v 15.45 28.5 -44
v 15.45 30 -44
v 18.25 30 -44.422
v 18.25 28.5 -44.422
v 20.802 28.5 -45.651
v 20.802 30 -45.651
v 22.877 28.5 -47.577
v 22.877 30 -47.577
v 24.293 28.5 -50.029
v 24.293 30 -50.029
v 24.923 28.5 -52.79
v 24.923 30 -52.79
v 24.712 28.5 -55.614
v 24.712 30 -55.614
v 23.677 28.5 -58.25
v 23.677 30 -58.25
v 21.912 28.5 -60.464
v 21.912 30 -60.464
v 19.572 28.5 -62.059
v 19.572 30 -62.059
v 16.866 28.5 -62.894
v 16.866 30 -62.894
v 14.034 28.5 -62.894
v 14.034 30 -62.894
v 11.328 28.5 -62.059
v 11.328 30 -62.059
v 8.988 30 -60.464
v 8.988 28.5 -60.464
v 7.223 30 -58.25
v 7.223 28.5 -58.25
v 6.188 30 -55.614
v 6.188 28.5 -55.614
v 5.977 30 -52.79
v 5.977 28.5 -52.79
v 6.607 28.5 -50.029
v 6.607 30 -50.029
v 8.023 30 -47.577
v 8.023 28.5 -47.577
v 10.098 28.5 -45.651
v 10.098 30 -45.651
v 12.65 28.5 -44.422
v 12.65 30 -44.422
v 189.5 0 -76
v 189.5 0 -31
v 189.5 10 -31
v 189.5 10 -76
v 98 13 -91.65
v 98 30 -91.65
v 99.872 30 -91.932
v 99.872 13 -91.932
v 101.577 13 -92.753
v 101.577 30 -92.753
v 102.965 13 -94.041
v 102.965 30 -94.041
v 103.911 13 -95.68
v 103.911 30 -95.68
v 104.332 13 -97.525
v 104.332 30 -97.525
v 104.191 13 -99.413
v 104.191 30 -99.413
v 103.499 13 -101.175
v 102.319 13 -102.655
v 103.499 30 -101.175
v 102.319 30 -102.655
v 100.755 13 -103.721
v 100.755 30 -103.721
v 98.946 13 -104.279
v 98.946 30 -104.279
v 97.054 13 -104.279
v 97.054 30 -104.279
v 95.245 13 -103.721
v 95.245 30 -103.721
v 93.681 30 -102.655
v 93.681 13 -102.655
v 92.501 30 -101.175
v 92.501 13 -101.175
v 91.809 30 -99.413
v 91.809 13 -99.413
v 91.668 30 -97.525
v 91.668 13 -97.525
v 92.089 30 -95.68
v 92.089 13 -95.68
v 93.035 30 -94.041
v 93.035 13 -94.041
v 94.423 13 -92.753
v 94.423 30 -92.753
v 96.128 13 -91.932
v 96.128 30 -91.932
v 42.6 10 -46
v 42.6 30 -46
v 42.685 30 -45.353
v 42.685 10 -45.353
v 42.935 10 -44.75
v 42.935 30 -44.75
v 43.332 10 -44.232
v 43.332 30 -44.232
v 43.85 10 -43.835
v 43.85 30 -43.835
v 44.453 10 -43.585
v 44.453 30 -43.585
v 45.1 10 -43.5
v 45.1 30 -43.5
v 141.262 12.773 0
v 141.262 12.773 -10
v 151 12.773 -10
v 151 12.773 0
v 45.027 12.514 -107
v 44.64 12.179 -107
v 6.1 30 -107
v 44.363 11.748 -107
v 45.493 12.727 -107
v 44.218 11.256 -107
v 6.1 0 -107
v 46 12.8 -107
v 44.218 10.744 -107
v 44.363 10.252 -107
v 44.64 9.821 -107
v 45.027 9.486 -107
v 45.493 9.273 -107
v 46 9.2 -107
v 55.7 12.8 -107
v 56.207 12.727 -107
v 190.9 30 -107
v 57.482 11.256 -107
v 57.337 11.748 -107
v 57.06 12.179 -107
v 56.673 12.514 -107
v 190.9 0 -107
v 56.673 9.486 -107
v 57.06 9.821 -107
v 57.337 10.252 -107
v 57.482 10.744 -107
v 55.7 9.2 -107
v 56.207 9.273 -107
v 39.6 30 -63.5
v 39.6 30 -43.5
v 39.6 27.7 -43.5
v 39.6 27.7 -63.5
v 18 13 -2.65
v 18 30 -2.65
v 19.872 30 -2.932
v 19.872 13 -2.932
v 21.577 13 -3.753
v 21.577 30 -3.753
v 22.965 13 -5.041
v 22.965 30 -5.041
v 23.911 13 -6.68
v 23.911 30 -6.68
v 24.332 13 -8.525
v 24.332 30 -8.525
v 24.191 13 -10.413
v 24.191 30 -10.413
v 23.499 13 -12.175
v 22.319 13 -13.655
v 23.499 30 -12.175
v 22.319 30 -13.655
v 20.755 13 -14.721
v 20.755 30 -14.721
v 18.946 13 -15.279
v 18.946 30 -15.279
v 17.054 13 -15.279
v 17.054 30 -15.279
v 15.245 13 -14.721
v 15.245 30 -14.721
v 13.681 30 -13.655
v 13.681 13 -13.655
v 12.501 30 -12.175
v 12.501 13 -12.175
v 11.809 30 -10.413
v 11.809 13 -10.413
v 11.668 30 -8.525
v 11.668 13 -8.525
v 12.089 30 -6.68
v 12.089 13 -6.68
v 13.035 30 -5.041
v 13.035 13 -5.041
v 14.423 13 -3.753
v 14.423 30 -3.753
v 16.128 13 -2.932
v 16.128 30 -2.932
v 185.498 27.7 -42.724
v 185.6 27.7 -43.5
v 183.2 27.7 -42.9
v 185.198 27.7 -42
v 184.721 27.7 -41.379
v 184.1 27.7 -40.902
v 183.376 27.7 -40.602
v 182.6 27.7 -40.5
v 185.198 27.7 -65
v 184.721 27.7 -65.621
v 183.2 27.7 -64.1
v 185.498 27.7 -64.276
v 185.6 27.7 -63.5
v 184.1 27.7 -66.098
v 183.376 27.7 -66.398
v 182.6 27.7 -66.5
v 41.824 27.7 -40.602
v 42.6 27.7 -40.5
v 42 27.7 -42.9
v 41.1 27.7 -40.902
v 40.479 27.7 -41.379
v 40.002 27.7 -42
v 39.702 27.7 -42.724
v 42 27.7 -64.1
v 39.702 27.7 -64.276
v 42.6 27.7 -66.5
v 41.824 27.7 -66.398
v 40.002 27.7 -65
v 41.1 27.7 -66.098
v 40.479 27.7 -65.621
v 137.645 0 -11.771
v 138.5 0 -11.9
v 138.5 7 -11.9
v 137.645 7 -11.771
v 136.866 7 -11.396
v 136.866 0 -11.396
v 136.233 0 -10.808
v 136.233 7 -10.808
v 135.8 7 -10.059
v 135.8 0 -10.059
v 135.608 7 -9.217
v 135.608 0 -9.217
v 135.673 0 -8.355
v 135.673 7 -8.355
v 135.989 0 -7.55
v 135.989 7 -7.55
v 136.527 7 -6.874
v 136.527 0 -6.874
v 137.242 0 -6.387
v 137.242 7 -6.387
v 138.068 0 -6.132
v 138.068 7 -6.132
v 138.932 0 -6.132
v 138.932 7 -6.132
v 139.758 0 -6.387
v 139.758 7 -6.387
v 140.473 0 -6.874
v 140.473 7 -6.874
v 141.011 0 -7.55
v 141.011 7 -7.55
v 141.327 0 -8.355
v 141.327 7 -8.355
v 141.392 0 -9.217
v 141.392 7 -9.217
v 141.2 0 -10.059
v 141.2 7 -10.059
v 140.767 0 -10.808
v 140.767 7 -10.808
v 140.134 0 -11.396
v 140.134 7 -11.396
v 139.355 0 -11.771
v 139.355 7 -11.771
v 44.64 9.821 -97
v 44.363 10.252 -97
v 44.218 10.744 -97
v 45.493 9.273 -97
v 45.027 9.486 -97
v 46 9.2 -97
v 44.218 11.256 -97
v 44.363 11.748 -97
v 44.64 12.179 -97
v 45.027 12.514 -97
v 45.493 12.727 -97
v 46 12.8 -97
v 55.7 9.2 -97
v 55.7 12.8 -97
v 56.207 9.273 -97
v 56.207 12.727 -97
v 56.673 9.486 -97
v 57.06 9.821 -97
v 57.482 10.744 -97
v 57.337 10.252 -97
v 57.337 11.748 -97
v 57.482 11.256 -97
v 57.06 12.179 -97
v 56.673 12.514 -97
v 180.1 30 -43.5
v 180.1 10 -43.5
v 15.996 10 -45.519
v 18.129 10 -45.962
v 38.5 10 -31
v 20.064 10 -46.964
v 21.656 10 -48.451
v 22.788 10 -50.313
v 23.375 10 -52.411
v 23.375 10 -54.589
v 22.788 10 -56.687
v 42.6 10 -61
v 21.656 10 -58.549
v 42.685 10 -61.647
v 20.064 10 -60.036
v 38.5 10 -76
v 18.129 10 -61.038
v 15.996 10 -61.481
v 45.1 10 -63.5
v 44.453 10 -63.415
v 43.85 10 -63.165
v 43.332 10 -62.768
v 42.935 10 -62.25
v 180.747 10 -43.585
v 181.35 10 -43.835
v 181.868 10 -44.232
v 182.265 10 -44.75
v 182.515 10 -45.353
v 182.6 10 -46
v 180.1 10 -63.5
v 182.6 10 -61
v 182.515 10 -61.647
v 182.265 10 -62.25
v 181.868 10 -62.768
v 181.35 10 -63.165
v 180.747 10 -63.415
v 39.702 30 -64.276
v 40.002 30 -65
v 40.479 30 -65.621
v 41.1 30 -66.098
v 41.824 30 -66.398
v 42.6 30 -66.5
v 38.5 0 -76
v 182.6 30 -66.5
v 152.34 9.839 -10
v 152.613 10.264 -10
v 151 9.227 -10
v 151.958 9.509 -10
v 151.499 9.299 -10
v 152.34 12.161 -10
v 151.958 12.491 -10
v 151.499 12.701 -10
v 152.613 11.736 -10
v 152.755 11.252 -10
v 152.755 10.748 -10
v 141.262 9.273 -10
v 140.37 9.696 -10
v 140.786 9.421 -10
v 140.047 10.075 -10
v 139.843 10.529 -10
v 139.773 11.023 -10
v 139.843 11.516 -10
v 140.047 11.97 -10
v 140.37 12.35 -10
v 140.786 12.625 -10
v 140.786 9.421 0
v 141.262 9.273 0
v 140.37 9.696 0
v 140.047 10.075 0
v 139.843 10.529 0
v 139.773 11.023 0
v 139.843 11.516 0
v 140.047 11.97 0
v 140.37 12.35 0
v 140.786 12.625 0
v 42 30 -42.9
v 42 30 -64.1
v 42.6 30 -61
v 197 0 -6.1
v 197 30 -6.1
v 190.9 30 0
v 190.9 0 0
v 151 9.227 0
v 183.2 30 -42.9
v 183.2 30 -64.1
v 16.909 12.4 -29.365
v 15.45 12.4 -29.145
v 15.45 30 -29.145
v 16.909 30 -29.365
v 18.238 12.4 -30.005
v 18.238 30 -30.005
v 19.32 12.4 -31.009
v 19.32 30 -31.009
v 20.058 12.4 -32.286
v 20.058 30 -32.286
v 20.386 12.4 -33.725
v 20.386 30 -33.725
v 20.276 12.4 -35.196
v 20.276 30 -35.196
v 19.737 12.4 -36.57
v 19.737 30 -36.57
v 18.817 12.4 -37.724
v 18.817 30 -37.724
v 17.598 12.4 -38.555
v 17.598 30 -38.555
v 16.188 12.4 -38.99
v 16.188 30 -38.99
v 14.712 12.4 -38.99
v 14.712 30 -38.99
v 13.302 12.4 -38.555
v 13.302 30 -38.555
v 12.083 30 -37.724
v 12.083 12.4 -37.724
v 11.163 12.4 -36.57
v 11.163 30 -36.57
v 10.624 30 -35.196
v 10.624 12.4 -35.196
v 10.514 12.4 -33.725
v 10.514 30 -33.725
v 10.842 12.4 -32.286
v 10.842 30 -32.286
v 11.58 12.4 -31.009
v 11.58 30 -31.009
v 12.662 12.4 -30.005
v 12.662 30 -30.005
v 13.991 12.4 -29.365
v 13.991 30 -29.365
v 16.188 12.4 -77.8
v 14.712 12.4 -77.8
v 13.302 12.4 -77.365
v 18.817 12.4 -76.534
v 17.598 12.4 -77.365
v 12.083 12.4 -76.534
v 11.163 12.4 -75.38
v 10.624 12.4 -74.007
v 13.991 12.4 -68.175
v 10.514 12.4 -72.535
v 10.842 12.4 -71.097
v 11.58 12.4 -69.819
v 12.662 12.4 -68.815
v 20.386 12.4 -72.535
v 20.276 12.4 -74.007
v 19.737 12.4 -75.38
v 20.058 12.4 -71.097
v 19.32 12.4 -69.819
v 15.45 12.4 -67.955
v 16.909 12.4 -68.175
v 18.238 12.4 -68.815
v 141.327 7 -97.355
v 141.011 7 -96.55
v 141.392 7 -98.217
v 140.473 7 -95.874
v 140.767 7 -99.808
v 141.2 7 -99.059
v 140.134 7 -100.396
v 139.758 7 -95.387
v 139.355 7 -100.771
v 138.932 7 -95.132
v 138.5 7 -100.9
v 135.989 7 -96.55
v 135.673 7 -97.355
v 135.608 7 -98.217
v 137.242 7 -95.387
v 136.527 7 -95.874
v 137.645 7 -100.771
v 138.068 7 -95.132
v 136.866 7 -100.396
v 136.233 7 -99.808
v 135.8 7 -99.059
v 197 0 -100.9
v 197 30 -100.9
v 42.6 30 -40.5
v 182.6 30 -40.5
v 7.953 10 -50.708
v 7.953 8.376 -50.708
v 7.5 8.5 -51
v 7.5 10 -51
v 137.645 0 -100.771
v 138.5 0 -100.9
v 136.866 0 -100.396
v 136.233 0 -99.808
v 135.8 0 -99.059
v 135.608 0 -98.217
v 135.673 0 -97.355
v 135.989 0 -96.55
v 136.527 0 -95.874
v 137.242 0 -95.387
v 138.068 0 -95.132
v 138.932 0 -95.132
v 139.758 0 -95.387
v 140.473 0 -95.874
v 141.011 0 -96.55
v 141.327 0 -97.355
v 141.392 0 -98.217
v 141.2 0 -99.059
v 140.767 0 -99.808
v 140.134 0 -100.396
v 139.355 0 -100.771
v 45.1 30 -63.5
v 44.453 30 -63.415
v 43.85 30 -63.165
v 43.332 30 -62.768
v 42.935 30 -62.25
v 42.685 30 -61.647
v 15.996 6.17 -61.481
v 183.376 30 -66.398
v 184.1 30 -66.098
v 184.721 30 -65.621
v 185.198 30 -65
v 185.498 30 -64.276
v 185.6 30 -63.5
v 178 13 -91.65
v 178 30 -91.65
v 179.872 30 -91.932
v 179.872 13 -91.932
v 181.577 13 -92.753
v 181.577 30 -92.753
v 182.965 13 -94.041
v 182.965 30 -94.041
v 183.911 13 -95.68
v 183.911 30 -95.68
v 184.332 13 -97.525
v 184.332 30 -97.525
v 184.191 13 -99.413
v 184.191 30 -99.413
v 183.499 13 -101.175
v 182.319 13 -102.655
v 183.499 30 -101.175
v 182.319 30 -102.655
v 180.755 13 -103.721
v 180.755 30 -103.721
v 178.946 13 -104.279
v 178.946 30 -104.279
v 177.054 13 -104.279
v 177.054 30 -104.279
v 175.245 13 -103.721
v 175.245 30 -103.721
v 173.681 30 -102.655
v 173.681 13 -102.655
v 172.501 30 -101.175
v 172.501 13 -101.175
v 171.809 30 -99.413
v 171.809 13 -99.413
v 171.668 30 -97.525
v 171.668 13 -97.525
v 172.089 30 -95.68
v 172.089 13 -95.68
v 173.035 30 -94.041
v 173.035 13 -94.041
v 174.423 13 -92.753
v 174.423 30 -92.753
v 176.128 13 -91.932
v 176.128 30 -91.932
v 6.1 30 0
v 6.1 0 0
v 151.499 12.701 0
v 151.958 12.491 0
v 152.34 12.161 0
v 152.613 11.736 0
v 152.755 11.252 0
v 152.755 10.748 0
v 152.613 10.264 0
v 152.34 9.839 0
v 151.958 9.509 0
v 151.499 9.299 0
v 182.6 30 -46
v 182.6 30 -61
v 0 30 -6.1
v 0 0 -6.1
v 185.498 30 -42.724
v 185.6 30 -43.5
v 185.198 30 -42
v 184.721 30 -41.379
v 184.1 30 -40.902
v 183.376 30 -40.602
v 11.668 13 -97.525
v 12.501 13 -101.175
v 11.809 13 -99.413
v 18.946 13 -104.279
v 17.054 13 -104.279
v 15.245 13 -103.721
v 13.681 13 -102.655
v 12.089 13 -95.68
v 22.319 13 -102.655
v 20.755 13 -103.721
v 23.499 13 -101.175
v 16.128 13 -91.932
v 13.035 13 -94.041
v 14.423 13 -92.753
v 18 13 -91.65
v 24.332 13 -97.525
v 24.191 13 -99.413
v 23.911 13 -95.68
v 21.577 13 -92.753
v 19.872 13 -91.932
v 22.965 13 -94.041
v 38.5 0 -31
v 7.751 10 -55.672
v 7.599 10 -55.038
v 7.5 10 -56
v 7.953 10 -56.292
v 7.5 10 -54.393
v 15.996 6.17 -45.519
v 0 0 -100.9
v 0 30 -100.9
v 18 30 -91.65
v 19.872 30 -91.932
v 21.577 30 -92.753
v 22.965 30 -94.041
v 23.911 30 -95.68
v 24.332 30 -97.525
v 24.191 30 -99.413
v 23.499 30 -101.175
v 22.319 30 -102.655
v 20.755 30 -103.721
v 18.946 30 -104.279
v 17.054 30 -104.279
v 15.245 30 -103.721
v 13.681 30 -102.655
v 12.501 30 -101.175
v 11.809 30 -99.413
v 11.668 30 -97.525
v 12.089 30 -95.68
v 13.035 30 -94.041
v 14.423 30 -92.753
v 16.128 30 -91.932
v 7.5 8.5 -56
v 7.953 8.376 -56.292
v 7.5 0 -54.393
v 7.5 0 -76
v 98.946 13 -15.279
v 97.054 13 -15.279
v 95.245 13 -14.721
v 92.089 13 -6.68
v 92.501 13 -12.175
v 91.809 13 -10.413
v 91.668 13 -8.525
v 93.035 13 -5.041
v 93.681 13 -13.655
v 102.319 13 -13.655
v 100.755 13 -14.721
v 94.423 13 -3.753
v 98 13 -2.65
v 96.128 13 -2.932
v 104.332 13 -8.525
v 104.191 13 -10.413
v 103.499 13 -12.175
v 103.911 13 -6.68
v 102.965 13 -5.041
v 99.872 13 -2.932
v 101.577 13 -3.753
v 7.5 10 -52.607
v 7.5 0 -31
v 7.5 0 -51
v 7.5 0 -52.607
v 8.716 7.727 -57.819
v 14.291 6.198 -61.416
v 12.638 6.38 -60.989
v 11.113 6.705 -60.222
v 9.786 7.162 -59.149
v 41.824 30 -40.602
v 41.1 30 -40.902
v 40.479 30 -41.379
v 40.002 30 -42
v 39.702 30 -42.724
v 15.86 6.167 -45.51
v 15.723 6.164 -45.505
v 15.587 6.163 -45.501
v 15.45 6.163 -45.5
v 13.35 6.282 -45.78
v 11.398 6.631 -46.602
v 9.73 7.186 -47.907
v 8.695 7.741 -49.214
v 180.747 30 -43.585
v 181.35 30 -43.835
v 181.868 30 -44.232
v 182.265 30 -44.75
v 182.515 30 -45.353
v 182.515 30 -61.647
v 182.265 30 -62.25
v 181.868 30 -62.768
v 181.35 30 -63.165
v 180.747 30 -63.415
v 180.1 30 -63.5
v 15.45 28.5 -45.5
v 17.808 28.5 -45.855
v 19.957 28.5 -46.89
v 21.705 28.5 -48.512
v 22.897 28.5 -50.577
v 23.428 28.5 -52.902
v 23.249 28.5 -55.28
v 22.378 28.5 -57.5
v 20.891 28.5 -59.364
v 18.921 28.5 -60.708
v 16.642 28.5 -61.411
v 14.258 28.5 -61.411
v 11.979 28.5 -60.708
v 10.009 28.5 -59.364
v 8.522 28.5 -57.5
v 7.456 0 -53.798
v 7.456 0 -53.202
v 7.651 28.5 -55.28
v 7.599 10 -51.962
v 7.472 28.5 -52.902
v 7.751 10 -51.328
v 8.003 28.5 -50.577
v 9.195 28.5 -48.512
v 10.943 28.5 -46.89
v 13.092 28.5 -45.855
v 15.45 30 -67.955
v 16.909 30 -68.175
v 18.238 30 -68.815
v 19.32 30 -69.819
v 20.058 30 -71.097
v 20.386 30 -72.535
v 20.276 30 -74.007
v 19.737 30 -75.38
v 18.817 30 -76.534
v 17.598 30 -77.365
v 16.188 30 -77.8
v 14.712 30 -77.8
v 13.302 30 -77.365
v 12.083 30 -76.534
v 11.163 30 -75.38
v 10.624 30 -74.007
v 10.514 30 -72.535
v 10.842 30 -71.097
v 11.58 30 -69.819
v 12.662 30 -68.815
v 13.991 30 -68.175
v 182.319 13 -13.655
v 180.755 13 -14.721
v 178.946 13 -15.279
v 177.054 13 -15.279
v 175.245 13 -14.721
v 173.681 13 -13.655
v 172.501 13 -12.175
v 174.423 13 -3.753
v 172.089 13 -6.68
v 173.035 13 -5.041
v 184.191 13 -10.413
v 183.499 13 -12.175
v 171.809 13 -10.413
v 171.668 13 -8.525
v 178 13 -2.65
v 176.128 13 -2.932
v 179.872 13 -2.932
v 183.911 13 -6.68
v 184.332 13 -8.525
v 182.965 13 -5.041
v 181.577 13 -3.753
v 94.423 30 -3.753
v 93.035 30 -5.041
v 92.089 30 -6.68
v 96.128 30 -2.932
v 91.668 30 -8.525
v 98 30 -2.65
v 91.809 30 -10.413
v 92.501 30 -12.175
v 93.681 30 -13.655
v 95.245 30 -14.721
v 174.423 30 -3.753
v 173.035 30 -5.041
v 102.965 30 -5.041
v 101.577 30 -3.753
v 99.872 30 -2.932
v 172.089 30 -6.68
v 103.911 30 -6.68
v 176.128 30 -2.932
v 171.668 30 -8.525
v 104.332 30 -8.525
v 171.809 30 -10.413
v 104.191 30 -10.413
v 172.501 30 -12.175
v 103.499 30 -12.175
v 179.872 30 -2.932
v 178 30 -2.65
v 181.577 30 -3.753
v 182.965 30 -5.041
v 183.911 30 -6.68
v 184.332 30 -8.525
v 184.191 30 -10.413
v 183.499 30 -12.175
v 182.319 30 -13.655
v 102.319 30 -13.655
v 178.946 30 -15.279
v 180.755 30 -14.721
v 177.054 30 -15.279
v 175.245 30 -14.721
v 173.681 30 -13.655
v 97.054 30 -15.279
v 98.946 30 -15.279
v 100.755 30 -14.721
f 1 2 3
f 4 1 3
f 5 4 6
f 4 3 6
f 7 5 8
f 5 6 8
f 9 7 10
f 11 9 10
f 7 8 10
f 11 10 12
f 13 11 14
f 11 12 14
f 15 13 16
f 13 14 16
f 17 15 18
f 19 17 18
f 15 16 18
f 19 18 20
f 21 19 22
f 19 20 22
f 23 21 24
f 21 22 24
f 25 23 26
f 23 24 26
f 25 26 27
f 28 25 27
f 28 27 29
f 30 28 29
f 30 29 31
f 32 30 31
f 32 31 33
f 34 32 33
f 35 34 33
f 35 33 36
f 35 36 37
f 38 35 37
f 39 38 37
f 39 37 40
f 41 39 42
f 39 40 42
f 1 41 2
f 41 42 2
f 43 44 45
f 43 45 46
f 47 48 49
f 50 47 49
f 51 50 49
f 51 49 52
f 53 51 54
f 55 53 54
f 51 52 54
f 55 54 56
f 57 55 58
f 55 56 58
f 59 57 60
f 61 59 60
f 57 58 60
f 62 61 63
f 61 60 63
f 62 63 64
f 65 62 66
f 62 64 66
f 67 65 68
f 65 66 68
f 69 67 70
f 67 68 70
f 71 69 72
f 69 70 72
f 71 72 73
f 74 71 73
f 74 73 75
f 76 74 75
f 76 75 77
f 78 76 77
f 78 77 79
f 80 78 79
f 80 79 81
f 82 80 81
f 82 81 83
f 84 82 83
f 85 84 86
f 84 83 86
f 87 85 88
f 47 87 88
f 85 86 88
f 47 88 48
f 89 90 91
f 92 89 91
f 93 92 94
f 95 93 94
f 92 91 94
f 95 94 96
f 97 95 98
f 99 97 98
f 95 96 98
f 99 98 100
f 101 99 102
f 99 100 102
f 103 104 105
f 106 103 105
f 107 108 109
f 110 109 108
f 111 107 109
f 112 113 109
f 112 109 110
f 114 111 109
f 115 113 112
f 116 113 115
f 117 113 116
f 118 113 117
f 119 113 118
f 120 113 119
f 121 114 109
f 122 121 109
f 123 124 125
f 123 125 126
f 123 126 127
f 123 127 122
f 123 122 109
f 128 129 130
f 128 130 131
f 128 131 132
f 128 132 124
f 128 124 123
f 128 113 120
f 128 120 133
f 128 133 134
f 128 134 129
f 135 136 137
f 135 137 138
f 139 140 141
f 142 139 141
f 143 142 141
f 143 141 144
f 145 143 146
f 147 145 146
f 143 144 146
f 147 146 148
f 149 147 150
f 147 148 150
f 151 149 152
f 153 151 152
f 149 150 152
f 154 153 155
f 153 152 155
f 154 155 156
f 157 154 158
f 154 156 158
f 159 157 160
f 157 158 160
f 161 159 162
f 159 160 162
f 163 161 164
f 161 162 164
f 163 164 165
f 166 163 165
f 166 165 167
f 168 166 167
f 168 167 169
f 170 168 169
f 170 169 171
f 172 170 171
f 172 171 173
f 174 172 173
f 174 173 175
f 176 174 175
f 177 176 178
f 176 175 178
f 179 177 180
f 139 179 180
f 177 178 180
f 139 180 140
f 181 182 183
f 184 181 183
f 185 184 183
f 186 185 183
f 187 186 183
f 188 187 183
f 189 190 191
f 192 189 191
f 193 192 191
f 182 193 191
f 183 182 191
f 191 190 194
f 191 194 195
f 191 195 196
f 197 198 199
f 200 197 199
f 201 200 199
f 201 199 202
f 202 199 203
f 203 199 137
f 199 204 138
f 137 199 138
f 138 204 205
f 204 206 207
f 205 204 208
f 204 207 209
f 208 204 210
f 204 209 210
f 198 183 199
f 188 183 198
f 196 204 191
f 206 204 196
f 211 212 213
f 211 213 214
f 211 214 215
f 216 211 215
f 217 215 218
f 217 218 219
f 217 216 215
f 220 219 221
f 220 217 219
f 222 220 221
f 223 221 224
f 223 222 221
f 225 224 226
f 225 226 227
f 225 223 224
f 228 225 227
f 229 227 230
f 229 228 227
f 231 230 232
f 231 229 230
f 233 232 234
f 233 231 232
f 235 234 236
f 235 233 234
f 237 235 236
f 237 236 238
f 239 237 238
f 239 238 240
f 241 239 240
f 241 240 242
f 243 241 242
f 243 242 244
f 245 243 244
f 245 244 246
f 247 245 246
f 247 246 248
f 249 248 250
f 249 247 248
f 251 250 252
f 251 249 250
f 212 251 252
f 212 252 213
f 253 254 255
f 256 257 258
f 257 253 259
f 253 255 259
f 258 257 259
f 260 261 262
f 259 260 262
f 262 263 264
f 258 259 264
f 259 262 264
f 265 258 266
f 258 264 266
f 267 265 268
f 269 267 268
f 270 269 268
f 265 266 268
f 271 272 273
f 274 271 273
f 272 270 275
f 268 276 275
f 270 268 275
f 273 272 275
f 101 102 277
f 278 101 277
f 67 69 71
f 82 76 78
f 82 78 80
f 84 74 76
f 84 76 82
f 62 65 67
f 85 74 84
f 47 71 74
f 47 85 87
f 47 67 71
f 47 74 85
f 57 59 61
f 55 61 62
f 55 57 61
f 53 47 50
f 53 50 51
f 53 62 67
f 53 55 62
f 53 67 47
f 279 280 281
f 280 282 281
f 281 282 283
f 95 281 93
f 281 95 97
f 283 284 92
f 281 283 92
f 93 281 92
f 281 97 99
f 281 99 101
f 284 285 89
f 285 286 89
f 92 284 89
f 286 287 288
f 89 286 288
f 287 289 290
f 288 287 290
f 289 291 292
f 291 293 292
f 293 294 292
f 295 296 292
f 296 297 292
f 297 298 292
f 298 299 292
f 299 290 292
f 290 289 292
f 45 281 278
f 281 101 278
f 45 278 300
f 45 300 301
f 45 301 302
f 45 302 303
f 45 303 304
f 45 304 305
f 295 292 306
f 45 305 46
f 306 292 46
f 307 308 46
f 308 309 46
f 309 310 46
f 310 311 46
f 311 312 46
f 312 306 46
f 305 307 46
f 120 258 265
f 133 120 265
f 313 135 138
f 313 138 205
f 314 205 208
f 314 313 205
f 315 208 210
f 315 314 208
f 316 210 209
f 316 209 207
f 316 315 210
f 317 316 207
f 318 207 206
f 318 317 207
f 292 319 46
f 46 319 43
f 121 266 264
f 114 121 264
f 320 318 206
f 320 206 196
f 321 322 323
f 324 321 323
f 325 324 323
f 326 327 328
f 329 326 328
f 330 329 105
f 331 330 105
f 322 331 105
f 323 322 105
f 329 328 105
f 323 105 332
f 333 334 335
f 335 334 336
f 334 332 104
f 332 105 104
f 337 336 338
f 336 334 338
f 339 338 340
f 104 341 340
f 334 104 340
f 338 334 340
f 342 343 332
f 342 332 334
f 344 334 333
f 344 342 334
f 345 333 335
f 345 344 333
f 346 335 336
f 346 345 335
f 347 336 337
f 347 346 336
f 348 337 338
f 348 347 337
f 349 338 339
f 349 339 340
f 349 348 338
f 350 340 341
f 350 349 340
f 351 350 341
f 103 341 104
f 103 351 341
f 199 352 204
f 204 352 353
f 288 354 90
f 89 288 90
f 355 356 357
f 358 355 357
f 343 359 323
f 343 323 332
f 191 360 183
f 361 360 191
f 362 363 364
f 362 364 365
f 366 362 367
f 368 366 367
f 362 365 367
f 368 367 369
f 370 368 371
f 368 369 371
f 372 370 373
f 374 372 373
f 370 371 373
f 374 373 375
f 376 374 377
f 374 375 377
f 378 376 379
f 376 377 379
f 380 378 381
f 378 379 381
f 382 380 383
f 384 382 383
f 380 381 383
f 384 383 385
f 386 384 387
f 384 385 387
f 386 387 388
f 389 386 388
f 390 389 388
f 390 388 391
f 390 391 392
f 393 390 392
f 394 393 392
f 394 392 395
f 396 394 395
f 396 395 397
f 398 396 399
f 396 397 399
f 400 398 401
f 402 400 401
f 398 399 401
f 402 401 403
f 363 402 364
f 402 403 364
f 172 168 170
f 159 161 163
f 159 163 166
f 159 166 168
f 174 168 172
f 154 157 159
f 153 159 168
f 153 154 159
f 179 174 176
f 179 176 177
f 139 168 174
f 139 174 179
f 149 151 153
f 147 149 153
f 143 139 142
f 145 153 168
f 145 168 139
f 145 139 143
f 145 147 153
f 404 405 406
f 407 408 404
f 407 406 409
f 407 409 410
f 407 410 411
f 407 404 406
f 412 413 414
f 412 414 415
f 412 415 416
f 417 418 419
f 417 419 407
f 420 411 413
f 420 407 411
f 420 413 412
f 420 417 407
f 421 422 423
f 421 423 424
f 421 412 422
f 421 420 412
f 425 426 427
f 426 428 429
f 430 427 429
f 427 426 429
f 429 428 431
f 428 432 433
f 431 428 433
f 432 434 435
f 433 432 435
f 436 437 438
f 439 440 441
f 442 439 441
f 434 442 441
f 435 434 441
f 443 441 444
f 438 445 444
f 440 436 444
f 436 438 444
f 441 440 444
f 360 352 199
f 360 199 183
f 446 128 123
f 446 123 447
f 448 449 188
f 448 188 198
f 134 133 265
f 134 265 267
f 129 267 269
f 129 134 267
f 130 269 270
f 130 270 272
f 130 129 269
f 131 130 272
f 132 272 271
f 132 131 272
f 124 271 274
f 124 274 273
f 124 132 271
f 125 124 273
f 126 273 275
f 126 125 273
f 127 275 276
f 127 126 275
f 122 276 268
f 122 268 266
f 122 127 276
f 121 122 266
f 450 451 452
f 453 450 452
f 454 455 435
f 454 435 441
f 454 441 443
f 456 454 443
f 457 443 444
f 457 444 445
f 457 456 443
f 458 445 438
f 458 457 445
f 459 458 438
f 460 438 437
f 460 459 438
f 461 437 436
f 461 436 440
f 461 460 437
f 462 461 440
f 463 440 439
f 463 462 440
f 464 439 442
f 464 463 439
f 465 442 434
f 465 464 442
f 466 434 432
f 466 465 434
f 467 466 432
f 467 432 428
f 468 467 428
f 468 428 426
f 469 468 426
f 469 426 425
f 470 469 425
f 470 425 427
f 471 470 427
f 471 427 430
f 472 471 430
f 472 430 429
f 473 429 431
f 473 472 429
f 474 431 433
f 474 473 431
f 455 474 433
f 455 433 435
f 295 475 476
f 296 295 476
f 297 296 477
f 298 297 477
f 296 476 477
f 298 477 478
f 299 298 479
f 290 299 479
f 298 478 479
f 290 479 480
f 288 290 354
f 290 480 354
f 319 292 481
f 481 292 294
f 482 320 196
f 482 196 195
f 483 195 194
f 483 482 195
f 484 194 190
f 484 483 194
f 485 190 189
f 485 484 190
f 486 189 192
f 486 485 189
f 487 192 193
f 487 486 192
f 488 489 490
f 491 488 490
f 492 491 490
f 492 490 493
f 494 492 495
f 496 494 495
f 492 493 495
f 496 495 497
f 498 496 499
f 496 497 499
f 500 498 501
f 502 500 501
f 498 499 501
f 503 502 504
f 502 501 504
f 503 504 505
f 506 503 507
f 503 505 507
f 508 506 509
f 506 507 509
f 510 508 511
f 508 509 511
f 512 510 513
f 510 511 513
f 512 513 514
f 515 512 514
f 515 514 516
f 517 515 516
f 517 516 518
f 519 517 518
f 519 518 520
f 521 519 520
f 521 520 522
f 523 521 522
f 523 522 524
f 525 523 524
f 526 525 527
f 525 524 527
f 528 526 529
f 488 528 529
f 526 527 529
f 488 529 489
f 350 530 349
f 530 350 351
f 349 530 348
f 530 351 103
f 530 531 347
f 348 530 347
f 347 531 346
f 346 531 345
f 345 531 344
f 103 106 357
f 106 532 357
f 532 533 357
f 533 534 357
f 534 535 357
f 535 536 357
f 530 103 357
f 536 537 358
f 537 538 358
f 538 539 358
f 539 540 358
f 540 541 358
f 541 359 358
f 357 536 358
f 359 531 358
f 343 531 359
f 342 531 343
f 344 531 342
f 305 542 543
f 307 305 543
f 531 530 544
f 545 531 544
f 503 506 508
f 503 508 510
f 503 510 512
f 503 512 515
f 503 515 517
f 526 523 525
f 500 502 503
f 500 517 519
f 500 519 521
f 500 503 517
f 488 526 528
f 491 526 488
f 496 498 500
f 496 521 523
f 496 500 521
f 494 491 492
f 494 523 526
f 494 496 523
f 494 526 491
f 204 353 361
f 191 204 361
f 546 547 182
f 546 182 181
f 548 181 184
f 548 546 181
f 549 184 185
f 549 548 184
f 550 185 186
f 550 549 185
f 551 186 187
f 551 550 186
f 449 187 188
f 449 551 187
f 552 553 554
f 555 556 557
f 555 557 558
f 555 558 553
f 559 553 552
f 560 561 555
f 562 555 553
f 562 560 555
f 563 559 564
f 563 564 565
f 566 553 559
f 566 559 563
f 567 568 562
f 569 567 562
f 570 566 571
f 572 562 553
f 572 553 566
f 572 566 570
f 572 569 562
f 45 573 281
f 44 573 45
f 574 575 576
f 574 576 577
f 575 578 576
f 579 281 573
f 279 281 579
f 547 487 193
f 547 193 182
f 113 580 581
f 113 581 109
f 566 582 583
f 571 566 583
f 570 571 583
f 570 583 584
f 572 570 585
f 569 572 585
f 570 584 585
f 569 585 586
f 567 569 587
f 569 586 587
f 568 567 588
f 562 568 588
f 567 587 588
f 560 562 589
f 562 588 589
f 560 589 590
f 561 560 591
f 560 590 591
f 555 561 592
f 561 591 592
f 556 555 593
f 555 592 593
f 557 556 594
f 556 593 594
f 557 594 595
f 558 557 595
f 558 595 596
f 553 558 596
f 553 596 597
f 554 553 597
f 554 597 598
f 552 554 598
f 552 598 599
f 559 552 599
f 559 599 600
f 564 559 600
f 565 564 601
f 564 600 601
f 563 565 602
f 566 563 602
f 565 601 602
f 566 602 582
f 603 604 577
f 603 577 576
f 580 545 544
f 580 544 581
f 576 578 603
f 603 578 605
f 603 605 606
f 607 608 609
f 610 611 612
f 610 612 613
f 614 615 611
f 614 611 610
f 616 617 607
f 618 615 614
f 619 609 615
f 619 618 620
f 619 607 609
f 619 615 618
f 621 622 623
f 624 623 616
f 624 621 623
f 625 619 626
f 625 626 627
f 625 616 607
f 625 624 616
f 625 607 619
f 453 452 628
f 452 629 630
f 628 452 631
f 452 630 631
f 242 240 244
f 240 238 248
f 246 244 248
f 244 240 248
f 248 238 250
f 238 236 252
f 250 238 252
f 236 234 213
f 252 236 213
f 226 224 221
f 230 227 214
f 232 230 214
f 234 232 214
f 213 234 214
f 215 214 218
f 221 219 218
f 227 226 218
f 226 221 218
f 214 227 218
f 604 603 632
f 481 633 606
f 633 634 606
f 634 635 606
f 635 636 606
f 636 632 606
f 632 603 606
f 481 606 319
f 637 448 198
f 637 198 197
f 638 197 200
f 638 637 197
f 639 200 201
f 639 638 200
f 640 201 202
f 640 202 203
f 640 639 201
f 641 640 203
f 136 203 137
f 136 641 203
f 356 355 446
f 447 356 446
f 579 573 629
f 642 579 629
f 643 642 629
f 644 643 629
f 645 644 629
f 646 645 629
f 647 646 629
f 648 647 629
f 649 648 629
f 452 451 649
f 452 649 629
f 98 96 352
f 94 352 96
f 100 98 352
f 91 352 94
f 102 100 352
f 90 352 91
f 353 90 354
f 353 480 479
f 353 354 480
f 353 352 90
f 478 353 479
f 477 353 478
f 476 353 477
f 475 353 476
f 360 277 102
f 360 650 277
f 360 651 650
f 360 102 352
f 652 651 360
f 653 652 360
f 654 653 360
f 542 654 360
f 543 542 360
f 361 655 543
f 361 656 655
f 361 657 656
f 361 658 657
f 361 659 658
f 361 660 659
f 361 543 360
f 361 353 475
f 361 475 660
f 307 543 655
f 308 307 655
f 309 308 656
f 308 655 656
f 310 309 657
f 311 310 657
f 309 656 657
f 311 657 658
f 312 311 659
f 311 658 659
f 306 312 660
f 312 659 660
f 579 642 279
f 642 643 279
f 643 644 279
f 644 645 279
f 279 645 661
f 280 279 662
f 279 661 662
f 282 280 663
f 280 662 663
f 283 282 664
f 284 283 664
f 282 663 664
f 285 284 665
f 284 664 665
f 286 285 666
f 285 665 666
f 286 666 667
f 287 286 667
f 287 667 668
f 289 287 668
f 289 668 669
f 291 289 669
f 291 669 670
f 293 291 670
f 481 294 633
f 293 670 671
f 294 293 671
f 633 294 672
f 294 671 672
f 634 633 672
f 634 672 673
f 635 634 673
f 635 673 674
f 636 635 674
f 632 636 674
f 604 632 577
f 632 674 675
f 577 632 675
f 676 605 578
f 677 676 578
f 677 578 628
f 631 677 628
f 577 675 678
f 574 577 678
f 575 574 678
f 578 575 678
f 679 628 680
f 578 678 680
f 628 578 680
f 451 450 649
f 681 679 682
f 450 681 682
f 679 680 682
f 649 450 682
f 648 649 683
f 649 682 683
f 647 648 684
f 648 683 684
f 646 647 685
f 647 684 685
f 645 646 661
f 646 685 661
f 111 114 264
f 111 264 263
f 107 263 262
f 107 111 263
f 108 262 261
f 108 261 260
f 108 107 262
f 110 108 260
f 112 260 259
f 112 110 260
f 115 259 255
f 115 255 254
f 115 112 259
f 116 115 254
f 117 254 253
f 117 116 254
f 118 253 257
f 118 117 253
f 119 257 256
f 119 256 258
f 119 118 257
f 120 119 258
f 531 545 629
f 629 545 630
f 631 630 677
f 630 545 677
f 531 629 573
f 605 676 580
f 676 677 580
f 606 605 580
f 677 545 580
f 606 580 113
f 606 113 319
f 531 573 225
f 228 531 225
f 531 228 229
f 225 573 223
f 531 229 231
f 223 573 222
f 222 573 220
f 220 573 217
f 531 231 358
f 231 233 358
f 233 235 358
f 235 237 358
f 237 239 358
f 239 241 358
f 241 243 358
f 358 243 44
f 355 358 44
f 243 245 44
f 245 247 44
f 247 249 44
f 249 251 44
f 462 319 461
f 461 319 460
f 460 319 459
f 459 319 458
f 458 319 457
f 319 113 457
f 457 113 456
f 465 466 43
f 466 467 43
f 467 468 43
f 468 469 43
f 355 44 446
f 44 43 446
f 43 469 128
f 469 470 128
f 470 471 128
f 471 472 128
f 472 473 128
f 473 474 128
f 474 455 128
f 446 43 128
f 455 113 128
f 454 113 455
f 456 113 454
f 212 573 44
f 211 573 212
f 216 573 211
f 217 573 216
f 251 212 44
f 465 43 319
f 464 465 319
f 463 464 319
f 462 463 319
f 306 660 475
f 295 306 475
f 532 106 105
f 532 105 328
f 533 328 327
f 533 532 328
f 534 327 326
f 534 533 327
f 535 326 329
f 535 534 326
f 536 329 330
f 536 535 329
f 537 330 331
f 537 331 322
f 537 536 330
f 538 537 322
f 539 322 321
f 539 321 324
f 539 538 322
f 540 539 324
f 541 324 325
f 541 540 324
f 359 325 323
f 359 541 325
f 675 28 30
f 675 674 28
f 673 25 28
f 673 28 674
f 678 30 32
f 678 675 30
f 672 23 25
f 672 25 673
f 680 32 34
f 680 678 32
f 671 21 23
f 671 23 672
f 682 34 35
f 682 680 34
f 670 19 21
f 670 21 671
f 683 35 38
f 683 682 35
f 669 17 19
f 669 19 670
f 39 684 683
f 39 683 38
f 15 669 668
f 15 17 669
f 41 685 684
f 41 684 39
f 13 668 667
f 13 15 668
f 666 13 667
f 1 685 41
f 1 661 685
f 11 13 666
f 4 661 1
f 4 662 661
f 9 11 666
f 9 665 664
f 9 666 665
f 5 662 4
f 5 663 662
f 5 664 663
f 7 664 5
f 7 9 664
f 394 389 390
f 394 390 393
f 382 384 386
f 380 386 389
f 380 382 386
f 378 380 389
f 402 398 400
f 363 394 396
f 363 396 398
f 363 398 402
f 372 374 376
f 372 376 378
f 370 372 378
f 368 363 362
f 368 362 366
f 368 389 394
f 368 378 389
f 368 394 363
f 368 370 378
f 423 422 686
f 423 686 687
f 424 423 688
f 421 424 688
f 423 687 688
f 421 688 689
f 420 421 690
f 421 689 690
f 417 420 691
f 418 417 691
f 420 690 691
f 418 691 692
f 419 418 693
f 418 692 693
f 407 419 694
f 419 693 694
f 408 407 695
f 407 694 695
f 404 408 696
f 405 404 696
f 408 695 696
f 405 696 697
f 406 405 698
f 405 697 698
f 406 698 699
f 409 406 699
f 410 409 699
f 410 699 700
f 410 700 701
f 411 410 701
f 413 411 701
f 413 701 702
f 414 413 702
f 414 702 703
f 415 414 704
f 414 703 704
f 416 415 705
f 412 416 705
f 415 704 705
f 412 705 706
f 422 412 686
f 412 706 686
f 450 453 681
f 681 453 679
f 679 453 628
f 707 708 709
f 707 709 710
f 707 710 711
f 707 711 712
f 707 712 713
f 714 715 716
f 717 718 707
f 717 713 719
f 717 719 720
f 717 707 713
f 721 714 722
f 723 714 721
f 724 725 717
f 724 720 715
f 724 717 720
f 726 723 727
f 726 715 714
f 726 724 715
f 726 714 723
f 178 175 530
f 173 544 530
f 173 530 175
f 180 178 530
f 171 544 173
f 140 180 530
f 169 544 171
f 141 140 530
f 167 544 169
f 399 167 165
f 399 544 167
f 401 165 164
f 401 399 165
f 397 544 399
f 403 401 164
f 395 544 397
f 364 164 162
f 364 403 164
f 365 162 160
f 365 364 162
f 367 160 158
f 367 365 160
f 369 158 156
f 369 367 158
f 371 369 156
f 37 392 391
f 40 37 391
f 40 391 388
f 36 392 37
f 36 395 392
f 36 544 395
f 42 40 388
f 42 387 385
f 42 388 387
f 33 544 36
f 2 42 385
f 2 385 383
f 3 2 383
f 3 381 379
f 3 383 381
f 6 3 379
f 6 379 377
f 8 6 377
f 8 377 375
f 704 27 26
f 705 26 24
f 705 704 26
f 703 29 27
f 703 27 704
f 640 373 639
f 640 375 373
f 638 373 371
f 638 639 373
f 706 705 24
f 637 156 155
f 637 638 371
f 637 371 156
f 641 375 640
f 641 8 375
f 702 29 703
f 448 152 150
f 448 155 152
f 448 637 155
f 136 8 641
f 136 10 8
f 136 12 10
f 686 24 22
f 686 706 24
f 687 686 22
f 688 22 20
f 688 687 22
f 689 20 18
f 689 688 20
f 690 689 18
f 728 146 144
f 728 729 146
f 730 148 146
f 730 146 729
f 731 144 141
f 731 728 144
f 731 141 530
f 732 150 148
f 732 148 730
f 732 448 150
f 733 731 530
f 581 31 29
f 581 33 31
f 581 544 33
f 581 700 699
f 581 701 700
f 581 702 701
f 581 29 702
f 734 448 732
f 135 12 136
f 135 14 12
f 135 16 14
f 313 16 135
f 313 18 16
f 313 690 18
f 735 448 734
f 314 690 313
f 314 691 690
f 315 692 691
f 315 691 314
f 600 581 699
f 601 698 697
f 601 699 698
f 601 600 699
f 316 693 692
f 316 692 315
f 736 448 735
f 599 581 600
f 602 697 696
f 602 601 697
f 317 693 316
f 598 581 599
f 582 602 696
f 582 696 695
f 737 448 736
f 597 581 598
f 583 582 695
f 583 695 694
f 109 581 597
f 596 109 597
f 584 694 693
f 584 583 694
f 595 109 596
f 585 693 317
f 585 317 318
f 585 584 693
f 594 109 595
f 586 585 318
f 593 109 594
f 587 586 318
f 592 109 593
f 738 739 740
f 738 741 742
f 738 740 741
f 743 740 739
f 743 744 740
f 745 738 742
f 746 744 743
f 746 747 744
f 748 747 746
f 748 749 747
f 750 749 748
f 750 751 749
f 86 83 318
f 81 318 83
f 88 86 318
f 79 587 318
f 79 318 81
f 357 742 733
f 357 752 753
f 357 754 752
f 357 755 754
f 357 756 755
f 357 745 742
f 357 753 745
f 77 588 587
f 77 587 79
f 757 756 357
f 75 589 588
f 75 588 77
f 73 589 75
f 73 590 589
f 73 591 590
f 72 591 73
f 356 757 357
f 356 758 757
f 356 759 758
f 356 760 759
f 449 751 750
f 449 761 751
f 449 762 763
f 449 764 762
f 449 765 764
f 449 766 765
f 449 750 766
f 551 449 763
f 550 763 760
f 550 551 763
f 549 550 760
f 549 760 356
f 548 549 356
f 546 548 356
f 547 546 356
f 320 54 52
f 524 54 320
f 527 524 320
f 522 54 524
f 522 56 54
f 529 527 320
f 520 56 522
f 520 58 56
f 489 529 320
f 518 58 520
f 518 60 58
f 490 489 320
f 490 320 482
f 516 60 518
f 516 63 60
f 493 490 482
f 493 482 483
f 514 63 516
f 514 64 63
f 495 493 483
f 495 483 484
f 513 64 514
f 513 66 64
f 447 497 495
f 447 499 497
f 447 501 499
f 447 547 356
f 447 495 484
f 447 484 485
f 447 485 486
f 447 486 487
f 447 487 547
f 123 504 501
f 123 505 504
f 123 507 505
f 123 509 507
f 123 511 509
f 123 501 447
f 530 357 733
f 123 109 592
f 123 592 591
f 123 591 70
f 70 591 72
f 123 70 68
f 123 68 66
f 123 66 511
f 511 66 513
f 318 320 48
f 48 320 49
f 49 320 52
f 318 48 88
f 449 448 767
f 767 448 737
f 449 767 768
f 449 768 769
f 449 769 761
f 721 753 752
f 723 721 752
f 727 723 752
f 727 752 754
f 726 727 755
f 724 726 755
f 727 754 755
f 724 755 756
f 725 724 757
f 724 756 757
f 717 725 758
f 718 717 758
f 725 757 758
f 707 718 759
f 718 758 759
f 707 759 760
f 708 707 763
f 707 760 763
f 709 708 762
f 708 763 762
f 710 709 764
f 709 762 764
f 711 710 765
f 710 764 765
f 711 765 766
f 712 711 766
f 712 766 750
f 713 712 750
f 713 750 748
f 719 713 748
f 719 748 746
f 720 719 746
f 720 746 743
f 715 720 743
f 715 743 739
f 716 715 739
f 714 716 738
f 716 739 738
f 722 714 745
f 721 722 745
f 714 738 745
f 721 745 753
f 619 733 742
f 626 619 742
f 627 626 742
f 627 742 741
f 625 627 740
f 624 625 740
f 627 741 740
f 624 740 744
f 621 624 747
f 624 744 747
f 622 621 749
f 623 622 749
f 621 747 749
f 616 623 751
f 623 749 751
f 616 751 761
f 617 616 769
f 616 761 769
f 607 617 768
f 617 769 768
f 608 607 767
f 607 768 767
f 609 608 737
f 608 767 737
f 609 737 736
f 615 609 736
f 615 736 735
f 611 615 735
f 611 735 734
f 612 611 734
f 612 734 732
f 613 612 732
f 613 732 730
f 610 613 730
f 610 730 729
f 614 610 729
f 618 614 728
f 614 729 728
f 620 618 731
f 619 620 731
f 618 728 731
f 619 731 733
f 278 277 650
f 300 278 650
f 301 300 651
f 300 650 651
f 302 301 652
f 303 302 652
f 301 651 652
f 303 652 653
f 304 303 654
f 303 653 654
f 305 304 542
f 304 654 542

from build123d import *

# Parameters (mm, degrees)
SKETCH1_W            = 197
SKETCH1_H            = 107
BOSS_EXTRUDE1_DEPTH  = 30
SKETCH4_W            = 182
SKETCH4_H            = 45
CUT_EXTRUDE2_DEPTH   = 10
BOSS_EXTRUDE11_DEPTH = 10
CUT_EXTRUDE28_DEPTH  = 14.5
SKETCH9_R            = 8
CUT_EXTRUDE6_DEPTH   = 171
SKETCH10_R           = 9.5
CUT_EXTRUDE7_DEPTH   = 1.5
SKETCH11_R           = 4.95
CUT_EXTRUDE8_DEPTH   = 17.6
SKETCH41_R           = 2.9
CUT_EXTRUDE21_DEPTH  = 7
CUT_EXTRUDE22_DEPTH  = 10
CUT_EXTRUDE23_DEPTH  = 10
CUT_EXTRUDE29_DEPTH  = 14.5
CUT_EXTRUDE36_DEPTH  = 55.4
SKETCH90_R           = 6.35
CUT_EXTRUDE38_DEPTH  = 17
SKETCH91_W           = 141.2
SKETCH91_H           = 21.2
CUT_EXTRUDE39_DEPTH  = 2.3
CUT_EXTRUDE40_DEPTH  = 227.181343174


with BuildPart() as part:
    # Sketch1 → Boss-Extrude1 (new body)
    with BuildSketch(Plane(origin=(0, 0, 0), x_dir=(1, 0, 0), z_dir=(0, 1, 0))):
        with Locations((98.5, 53.5)):
            Rectangle(SKETCH1_W, SKETCH1_H)
    extrude(amount=BOSS_EXTRUDE1_DEPTH)

    # Sketch4 → Cut-Extrude2 (cut)
    with BuildSketch(Plane(origin=(0, 0, 0), x_dir=(1, 0, 0), z_dir=(0, 1, 0))):
        with Locations((98.5, 53.5)):
            Rectangle(SKETCH4_W, SKETCH4_H)
    extrude(amount=CUT_EXTRUDE2_DEPTH, mode=Mode.SUBTRACT)

    # Sketch53 → Boss-Extrude11 (add)
    with BuildSketch(Plane(origin=(0, 10, 0), x_dir=(-1, 0, 0), z_dir=(0, -1, 0))):
        Polygon((-7.5, 51), (-7.5, 31), (-38.5, 31), align=None)
        Polygon((-7.5, 56), (-7.5, 76), (-38.5, 76), align=None)
    extrude(amount=BOSS_EXTRUDE11_DEPTH)

    # Izq → Cut-Extrude28 (cut)
    with BuildSketch(Plane(origin=(0, 27.358390683, -11.62731604), x_dir=(1, 0, 0), z_dir=(0, 0.9203309184584746, -0.3911406403448515))):
        Polygon((7.5, 48.213835991), (38.5, 69.945149803), (7.5, 69.945149803), align=None)
    extrude(amount=-CUT_EXTRUDE28_DEPTH, mode=Mode.SUBTRACT)

    # Sketch9 → Cut-Extrude6 (cut)
    with BuildSketch(Plane(origin=(0, 30, 0), x_dir=(1, 0, 0), z_dir=(0, 1, 0))):
        with Locations(Location((15.45, 53.5, 0), (0, 0, 270))):
            Circle(SKETCH9_R)
    extrude(amount=-CUT_EXTRUDE6_DEPTH, mode=Mode.SUBTRACT)

    # Sketch10 → Cut-Extrude7 (cut)
    with BuildSketch(Plane(origin=(0, 30, 0), x_dir=(1, 0, 0), z_dir=(0, 1, 0))):
        with Locations(Location((15.45, 53.5, 0), (0, 0, 270))):
            Circle(SKETCH10_R)
    extrude(amount=-CUT_EXTRUDE7_DEPTH, mode=Mode.SUBTRACT)

    # Sketch11 → Cut-Extrude8 (cut)
    with BuildSketch(Plane(origin=(0, 30, 0), x_dir=(1, 0, 0), z_dir=(0, 1, 0))):
        with Locations(Location((15.45, 72.905102572, 0), (0, 0, 270))):
            Circle(SKETCH11_R)
        with Locations(Location((15.45, 34.094897428, 0), (0, 0, 270))):
            Circle(SKETCH11_R)
    extrude(amount=-CUT_EXTRUDE8_DEPTH, mode=Mode.SUBTRACT)

    # Sketch41 → Cut-Extrude21 (cut)
    with BuildSketch(Plane(origin=(0, 0, 0), x_dir=(1, 0, 0), z_dir=(0, 1, 0))):
        with Locations(Location((138.5, 9, 0), (0, 0, 90))):
            Circle(SKETCH41_R)
        with Locations(Location((138.5, 98, 0), (0, 0, 90))):
            Circle(SKETCH41_R)
    extrude(amount=CUT_EXTRUDE21_DEPTH, mode=Mode.SUBTRACT)

    # Sketch42 → Cut-Extrude22 (cut)
    with BuildSketch(Plane.XY):
        with BuildLine():
            Line((141.261527075, 12.77273886), (151, 12.77273886))
            ThreePointArc((151, 12.77273886), (152.77273886, 11), (151, 9.22726114))
            Line((151, 9.22726114), (141.261527075, 9.27273886))
            ThreePointArc((141.261527075, 9.27273886), (139.77273886, 11.02273886), (141.261527075, 12.77273886))
        make_face()
    extrude(amount=-CUT_EXTRUDE22_DEPTH, mode=Mode.SUBTRACT)

    # Sketch43 → Cut-Extrude23 (cut)
    with BuildSketch(Plane(origin=(0, 0, -107), x_dir=(-1, 0, 0), z_dir=(0, 0, -1))):
        with BuildLine():
            Line((-55.7, 12.8), (-46, 12.8))
            ThreePointArc((-46, 12.8), (-44.2, 11), (-46, 9.2))
            Line((-46, 9.2), (-55.7, 9.2))
            ThreePointArc((-55.7, 9.2), (-57.5, 11), (-55.7, 12.8))
        make_face()
    extrude(amount=-CUT_EXTRUDE23_DEPTH, mode=Mode.SUBTRACT)

    # Der → Cut-Extrude29 (cut)
    with BuildSketch(Plane(origin=(0, -11.159343568, -4.742721016), x_dir=(1, 0, 0), z_dir=(0, 0.9203309184584747, 0.3911406403448517))):
        Polygon((7.5, 50.261572284), (38.5, 28.530258472), (7.5, 28.530258472), align=None)
    extrude(amount=-CUT_EXTRUDE29_DEPTH, mode=Mode.SUBTRACT)

    # Sketch85 → Cut-Extrude36 (cut)
    with BuildSketch(Plane(origin=(0, 30, 0), x_dir=(1, 0, 0), z_dir=(0, 1, 0))):
        Polygon((0, 100.9), (6.1, 107), (0, 107), align=None)
        Polygon((0, 0), (6.1, 0), (0, 6.1), align=None)
        Polygon((197, 6.1), (190.9, 0), (197, 0), align=None)
        Polygon((197, 107), (190.9, 107), (197, 100.9), align=None)
    extrude(amount=-CUT_EXTRUDE36_DEPTH, mode=Mode.SUBTRACT)

    # Sketch90 → Cut-Extrude38 (cut)
    with BuildSketch(Plane(origin=(0, 30, 0), x_dir=(1, 0, 0), z_dir=(0, 1, 0))):
        with Locations(Location((18, 9, 0), (0, 0, 270))):
            Circle(SKETCH90_R)
        with Locations(Location((98, 9, 0), (0, 0, 270))):
            Circle(SKETCH90_R)
        with Locations(Location((178, 9, 0), (0, 0, 270))):
            Circle(SKETCH90_R)
        with Locations(Location((98, 98, 0), (0, 0, 270))):
            Circle(SKETCH90_R)
        with Locations(Location((178, 98, 0), (0, 0, 270))):
            Circle(SKETCH90_R)
        with Locations(Location((18, 98, 0), (0, 0, 270))):
            Circle(SKETCH90_R)
    extrude(amount=-CUT_EXTRUDE38_DEPTH, mode=Mode.SUBTRACT)

    # Sketch91 → Cut-Extrude39 (cut)
    with BuildSketch(Plane(origin=(0, 30, 0), x_dir=(1, 0, 0), z_dir=(0, 1, 0))):
        with BuildLine():
            Line((42.6, 66.5), (182.6, 66.5))
            ThreePointArc((182.6, 66.5), (184.721320344, 65.621320344), (185.6, 63.5))
            Line((185.6, 63.5), (185.6, 43.5))
            ThreePointArc((185.6, 43.5), (184.721320344, 41.378679656), (182.6, 40.5))
            Line((182.6, 40.5), (42.6, 40.5))
            ThreePointArc((42.6, 40.5), (40.478679656, 41.378679656), (39.6, 43.5))
            Line((39.6, 43.5), (39.6, 63.5))
            ThreePointArc((39.6, 63.5), (40.478679656, 65.621320344), (42.6, 66.5))
        make_face()
        with Locations((112.6, 53.5)):
            Rectangle(SKETCH91_W, SKETCH91_H, mode=Mode.SUBTRACT)
    extrude(amount=-CUT_EXTRUDE39_DEPTH, mode=Mode.SUBTRACT)

    # Sketch93 → Cut-Extrude40 (cut, through all)
    with BuildSketch(Plane(origin=(0, 30, 0), x_dir=(1, 0, 0), z_dir=(0, 1, 0))):
        with BuildLine():
            Line((45.1, 43.5), (180.1, 43.5))
            ThreePointArc((180.1, 43.5), (181.867766953, 44.232233047), (182.6, 46))
            Line((182.6, 46), (182.6, 61))
            ThreePointArc((182.6, 61), (181.867766953, 62.767766953), (180.1, 63.5))
            Line((180.1, 63.5), (45.1, 63.5))
            ThreePointArc((45.1, 63.5), (43.332233047, 62.767766953), (42.6, 61))
            Line((42.6, 61), (42.6, 46))
            ThreePointArc((42.6, 46), (43.332233047, 44.232233047), (45.1, 43.5))
        make_face()
    extrude(amount=-CUT_EXTRUDE40_DEPTH, mode=Mode.SUBTRACT)


solid = part.part
